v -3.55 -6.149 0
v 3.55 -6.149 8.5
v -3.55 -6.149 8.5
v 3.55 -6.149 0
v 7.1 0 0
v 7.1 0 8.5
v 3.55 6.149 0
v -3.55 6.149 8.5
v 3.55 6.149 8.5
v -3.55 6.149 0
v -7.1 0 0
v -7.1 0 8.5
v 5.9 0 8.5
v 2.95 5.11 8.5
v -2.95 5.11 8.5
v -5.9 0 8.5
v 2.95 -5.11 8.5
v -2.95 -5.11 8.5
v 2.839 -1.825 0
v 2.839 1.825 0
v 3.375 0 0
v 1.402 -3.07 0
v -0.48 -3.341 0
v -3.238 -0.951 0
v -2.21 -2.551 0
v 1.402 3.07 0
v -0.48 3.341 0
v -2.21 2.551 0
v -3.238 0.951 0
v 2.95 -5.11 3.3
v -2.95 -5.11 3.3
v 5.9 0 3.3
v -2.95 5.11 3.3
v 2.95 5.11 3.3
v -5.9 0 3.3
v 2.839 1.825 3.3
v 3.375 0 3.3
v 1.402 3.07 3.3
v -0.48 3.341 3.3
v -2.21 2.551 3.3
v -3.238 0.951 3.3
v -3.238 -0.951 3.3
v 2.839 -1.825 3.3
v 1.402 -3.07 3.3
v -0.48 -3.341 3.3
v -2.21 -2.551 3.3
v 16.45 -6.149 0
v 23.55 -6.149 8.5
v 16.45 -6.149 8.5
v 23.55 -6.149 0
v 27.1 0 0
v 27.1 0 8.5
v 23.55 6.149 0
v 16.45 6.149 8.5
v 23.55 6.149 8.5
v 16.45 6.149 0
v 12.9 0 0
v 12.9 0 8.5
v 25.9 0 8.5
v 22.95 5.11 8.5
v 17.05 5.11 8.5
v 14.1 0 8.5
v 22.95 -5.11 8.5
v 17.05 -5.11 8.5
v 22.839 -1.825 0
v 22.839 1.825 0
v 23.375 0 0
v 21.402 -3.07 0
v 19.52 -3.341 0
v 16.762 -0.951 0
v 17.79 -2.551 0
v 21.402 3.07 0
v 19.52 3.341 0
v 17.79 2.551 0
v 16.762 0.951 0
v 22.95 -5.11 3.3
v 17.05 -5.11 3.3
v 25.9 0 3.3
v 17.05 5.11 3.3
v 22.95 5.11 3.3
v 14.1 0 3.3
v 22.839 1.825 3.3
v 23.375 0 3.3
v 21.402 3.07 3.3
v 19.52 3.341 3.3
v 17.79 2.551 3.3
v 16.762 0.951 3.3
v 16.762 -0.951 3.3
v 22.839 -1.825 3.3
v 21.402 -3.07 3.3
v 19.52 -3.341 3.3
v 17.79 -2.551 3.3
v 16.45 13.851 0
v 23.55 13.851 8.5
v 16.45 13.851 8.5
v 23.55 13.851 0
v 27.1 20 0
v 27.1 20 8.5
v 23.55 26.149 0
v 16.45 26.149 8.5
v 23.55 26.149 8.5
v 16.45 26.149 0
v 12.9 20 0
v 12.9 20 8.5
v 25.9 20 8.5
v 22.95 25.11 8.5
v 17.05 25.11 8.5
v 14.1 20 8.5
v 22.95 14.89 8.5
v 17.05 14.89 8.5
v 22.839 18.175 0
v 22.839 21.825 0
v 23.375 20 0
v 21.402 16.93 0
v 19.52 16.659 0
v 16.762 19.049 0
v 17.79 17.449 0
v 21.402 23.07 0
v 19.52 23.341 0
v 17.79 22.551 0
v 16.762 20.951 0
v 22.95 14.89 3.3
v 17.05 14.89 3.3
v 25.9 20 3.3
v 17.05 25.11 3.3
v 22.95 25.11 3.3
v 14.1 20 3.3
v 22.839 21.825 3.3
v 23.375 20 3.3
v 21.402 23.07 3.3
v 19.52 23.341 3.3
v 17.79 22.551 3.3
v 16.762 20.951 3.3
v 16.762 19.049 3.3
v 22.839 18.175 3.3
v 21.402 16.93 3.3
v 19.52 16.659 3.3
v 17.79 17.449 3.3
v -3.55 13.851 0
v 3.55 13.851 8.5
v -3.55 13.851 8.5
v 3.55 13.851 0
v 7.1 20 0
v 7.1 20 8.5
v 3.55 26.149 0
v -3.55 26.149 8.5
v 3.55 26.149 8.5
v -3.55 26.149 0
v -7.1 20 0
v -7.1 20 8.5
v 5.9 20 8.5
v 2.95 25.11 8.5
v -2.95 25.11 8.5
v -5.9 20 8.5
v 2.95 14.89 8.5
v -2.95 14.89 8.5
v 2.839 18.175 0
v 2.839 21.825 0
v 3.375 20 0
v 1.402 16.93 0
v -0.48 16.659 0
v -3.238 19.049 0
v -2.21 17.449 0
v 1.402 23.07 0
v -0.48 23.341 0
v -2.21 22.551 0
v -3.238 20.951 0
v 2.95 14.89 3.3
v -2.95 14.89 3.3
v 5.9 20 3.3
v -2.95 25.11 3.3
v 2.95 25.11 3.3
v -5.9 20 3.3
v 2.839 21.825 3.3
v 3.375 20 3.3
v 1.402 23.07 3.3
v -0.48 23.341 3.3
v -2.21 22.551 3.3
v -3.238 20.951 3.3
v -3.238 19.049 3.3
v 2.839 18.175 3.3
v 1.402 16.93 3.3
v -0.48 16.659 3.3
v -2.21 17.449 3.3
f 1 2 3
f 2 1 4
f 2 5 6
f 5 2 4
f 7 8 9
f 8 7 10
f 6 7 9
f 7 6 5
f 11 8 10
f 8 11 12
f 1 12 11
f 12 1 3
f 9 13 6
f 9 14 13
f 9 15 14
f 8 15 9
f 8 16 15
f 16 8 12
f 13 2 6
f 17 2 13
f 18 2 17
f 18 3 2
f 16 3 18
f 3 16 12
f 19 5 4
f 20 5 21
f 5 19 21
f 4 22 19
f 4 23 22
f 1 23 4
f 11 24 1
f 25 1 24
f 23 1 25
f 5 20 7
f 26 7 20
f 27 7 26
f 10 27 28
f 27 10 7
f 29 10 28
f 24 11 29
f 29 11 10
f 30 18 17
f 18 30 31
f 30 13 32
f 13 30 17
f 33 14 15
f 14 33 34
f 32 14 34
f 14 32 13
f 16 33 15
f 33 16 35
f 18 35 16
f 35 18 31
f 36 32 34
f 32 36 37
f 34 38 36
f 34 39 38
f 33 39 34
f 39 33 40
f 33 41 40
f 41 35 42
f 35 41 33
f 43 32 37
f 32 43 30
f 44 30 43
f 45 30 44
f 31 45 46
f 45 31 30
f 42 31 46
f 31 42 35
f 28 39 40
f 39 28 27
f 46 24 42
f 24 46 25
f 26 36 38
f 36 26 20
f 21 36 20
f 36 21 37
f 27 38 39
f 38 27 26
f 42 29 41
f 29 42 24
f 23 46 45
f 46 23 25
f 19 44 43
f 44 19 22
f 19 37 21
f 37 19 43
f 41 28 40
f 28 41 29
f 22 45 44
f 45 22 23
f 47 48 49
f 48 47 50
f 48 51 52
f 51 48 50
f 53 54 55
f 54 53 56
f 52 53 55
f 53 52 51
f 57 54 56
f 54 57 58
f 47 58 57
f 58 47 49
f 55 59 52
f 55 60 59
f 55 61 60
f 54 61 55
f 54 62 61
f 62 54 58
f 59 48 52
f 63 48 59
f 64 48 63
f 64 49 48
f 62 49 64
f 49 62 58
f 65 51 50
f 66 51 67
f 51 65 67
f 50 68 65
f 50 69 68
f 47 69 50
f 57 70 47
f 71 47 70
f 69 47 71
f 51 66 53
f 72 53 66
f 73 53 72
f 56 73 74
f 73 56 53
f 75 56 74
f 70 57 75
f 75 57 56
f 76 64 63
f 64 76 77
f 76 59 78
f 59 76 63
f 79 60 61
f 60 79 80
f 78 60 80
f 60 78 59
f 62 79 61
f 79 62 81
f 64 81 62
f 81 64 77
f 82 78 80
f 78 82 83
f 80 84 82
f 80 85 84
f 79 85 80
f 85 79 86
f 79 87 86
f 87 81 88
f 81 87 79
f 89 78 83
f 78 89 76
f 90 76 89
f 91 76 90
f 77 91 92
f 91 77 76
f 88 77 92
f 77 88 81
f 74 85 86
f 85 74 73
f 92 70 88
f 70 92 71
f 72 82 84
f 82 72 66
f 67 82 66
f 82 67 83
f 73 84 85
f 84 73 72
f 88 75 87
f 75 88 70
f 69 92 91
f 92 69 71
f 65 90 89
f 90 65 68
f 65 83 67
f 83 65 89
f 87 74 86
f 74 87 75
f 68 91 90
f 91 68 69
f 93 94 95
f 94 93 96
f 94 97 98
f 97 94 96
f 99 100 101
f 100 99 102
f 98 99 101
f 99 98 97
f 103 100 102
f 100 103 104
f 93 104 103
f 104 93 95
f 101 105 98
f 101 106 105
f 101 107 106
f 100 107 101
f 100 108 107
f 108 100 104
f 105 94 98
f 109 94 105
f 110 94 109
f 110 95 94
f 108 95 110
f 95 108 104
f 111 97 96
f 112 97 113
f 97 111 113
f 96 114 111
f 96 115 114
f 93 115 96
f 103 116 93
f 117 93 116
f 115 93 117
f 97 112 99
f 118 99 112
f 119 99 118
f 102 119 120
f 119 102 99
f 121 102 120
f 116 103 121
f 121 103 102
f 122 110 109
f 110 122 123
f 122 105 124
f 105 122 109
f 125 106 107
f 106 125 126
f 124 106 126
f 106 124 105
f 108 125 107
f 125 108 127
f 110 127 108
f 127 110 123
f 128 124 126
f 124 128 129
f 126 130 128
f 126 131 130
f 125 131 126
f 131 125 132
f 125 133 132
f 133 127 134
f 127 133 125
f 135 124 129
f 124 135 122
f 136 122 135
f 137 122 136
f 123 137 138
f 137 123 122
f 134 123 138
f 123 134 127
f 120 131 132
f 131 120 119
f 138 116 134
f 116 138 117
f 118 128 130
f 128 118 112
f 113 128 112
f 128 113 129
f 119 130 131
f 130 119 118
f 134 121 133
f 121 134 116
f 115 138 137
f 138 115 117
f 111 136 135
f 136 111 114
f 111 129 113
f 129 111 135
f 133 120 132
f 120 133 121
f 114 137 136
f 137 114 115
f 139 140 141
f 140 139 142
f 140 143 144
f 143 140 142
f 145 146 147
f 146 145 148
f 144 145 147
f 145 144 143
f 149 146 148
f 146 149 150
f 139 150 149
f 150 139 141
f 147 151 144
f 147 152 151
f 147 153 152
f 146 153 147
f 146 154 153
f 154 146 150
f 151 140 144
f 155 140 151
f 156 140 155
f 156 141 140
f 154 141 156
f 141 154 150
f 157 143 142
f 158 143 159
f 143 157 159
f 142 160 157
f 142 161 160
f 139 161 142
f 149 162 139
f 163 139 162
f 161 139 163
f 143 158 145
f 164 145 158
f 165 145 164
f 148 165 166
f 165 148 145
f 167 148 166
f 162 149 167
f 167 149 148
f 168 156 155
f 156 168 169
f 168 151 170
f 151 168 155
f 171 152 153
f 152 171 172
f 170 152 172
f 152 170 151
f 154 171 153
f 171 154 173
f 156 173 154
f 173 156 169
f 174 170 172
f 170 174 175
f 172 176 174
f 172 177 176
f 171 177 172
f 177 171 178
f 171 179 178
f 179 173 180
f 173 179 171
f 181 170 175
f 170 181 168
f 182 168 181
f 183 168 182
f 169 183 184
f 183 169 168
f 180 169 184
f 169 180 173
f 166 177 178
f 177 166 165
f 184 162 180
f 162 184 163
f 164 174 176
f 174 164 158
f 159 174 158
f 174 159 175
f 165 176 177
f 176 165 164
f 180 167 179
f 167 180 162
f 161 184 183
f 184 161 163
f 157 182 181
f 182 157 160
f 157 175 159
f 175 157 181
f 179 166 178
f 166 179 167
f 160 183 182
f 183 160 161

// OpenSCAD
base_thickness = 1.5; 
m8_nut_dia = 14.5; // was 14.38
m8_nut_height = 7;
m6_nut_dia = 11.5;
m6_nut_height = 5.2;
gap = .15; // leave gap around all edges
m6_rod_dia = 6 + gap;

four_adapters();

module four_adapters(){
	adapter();
	translate([20,0,0]) adapter();
	translate([20,20,0]) adapter();
	translate([0,20,0]) adapter();
}


// size of m8 nut - gap
function m8_rad()  = m8_nut_dia / 2 - gap;

// size of m6 nut trap + gap
function m6_rad()  = m6_nut_dia / 2 + gap; 

function adapter_height() = m8_nut_height + base_thickness;

module adapter(){
	difference(){
		cylinder(r=m8_rad(), h = adapter_height() , $fn=6);
		
		// subtract cutout for m6 nut
		translate([0, 0, adapter_height() - m6_nut_height])
			cylinder(r=m6_rad(), h = m6_nut_height + .1, $fn=6);
		translate([0, 0, -.1])
		cylinder(r=m6_rod_dia / 2 + 2 * gap, h = adapter_height() + .2);
	}
}
